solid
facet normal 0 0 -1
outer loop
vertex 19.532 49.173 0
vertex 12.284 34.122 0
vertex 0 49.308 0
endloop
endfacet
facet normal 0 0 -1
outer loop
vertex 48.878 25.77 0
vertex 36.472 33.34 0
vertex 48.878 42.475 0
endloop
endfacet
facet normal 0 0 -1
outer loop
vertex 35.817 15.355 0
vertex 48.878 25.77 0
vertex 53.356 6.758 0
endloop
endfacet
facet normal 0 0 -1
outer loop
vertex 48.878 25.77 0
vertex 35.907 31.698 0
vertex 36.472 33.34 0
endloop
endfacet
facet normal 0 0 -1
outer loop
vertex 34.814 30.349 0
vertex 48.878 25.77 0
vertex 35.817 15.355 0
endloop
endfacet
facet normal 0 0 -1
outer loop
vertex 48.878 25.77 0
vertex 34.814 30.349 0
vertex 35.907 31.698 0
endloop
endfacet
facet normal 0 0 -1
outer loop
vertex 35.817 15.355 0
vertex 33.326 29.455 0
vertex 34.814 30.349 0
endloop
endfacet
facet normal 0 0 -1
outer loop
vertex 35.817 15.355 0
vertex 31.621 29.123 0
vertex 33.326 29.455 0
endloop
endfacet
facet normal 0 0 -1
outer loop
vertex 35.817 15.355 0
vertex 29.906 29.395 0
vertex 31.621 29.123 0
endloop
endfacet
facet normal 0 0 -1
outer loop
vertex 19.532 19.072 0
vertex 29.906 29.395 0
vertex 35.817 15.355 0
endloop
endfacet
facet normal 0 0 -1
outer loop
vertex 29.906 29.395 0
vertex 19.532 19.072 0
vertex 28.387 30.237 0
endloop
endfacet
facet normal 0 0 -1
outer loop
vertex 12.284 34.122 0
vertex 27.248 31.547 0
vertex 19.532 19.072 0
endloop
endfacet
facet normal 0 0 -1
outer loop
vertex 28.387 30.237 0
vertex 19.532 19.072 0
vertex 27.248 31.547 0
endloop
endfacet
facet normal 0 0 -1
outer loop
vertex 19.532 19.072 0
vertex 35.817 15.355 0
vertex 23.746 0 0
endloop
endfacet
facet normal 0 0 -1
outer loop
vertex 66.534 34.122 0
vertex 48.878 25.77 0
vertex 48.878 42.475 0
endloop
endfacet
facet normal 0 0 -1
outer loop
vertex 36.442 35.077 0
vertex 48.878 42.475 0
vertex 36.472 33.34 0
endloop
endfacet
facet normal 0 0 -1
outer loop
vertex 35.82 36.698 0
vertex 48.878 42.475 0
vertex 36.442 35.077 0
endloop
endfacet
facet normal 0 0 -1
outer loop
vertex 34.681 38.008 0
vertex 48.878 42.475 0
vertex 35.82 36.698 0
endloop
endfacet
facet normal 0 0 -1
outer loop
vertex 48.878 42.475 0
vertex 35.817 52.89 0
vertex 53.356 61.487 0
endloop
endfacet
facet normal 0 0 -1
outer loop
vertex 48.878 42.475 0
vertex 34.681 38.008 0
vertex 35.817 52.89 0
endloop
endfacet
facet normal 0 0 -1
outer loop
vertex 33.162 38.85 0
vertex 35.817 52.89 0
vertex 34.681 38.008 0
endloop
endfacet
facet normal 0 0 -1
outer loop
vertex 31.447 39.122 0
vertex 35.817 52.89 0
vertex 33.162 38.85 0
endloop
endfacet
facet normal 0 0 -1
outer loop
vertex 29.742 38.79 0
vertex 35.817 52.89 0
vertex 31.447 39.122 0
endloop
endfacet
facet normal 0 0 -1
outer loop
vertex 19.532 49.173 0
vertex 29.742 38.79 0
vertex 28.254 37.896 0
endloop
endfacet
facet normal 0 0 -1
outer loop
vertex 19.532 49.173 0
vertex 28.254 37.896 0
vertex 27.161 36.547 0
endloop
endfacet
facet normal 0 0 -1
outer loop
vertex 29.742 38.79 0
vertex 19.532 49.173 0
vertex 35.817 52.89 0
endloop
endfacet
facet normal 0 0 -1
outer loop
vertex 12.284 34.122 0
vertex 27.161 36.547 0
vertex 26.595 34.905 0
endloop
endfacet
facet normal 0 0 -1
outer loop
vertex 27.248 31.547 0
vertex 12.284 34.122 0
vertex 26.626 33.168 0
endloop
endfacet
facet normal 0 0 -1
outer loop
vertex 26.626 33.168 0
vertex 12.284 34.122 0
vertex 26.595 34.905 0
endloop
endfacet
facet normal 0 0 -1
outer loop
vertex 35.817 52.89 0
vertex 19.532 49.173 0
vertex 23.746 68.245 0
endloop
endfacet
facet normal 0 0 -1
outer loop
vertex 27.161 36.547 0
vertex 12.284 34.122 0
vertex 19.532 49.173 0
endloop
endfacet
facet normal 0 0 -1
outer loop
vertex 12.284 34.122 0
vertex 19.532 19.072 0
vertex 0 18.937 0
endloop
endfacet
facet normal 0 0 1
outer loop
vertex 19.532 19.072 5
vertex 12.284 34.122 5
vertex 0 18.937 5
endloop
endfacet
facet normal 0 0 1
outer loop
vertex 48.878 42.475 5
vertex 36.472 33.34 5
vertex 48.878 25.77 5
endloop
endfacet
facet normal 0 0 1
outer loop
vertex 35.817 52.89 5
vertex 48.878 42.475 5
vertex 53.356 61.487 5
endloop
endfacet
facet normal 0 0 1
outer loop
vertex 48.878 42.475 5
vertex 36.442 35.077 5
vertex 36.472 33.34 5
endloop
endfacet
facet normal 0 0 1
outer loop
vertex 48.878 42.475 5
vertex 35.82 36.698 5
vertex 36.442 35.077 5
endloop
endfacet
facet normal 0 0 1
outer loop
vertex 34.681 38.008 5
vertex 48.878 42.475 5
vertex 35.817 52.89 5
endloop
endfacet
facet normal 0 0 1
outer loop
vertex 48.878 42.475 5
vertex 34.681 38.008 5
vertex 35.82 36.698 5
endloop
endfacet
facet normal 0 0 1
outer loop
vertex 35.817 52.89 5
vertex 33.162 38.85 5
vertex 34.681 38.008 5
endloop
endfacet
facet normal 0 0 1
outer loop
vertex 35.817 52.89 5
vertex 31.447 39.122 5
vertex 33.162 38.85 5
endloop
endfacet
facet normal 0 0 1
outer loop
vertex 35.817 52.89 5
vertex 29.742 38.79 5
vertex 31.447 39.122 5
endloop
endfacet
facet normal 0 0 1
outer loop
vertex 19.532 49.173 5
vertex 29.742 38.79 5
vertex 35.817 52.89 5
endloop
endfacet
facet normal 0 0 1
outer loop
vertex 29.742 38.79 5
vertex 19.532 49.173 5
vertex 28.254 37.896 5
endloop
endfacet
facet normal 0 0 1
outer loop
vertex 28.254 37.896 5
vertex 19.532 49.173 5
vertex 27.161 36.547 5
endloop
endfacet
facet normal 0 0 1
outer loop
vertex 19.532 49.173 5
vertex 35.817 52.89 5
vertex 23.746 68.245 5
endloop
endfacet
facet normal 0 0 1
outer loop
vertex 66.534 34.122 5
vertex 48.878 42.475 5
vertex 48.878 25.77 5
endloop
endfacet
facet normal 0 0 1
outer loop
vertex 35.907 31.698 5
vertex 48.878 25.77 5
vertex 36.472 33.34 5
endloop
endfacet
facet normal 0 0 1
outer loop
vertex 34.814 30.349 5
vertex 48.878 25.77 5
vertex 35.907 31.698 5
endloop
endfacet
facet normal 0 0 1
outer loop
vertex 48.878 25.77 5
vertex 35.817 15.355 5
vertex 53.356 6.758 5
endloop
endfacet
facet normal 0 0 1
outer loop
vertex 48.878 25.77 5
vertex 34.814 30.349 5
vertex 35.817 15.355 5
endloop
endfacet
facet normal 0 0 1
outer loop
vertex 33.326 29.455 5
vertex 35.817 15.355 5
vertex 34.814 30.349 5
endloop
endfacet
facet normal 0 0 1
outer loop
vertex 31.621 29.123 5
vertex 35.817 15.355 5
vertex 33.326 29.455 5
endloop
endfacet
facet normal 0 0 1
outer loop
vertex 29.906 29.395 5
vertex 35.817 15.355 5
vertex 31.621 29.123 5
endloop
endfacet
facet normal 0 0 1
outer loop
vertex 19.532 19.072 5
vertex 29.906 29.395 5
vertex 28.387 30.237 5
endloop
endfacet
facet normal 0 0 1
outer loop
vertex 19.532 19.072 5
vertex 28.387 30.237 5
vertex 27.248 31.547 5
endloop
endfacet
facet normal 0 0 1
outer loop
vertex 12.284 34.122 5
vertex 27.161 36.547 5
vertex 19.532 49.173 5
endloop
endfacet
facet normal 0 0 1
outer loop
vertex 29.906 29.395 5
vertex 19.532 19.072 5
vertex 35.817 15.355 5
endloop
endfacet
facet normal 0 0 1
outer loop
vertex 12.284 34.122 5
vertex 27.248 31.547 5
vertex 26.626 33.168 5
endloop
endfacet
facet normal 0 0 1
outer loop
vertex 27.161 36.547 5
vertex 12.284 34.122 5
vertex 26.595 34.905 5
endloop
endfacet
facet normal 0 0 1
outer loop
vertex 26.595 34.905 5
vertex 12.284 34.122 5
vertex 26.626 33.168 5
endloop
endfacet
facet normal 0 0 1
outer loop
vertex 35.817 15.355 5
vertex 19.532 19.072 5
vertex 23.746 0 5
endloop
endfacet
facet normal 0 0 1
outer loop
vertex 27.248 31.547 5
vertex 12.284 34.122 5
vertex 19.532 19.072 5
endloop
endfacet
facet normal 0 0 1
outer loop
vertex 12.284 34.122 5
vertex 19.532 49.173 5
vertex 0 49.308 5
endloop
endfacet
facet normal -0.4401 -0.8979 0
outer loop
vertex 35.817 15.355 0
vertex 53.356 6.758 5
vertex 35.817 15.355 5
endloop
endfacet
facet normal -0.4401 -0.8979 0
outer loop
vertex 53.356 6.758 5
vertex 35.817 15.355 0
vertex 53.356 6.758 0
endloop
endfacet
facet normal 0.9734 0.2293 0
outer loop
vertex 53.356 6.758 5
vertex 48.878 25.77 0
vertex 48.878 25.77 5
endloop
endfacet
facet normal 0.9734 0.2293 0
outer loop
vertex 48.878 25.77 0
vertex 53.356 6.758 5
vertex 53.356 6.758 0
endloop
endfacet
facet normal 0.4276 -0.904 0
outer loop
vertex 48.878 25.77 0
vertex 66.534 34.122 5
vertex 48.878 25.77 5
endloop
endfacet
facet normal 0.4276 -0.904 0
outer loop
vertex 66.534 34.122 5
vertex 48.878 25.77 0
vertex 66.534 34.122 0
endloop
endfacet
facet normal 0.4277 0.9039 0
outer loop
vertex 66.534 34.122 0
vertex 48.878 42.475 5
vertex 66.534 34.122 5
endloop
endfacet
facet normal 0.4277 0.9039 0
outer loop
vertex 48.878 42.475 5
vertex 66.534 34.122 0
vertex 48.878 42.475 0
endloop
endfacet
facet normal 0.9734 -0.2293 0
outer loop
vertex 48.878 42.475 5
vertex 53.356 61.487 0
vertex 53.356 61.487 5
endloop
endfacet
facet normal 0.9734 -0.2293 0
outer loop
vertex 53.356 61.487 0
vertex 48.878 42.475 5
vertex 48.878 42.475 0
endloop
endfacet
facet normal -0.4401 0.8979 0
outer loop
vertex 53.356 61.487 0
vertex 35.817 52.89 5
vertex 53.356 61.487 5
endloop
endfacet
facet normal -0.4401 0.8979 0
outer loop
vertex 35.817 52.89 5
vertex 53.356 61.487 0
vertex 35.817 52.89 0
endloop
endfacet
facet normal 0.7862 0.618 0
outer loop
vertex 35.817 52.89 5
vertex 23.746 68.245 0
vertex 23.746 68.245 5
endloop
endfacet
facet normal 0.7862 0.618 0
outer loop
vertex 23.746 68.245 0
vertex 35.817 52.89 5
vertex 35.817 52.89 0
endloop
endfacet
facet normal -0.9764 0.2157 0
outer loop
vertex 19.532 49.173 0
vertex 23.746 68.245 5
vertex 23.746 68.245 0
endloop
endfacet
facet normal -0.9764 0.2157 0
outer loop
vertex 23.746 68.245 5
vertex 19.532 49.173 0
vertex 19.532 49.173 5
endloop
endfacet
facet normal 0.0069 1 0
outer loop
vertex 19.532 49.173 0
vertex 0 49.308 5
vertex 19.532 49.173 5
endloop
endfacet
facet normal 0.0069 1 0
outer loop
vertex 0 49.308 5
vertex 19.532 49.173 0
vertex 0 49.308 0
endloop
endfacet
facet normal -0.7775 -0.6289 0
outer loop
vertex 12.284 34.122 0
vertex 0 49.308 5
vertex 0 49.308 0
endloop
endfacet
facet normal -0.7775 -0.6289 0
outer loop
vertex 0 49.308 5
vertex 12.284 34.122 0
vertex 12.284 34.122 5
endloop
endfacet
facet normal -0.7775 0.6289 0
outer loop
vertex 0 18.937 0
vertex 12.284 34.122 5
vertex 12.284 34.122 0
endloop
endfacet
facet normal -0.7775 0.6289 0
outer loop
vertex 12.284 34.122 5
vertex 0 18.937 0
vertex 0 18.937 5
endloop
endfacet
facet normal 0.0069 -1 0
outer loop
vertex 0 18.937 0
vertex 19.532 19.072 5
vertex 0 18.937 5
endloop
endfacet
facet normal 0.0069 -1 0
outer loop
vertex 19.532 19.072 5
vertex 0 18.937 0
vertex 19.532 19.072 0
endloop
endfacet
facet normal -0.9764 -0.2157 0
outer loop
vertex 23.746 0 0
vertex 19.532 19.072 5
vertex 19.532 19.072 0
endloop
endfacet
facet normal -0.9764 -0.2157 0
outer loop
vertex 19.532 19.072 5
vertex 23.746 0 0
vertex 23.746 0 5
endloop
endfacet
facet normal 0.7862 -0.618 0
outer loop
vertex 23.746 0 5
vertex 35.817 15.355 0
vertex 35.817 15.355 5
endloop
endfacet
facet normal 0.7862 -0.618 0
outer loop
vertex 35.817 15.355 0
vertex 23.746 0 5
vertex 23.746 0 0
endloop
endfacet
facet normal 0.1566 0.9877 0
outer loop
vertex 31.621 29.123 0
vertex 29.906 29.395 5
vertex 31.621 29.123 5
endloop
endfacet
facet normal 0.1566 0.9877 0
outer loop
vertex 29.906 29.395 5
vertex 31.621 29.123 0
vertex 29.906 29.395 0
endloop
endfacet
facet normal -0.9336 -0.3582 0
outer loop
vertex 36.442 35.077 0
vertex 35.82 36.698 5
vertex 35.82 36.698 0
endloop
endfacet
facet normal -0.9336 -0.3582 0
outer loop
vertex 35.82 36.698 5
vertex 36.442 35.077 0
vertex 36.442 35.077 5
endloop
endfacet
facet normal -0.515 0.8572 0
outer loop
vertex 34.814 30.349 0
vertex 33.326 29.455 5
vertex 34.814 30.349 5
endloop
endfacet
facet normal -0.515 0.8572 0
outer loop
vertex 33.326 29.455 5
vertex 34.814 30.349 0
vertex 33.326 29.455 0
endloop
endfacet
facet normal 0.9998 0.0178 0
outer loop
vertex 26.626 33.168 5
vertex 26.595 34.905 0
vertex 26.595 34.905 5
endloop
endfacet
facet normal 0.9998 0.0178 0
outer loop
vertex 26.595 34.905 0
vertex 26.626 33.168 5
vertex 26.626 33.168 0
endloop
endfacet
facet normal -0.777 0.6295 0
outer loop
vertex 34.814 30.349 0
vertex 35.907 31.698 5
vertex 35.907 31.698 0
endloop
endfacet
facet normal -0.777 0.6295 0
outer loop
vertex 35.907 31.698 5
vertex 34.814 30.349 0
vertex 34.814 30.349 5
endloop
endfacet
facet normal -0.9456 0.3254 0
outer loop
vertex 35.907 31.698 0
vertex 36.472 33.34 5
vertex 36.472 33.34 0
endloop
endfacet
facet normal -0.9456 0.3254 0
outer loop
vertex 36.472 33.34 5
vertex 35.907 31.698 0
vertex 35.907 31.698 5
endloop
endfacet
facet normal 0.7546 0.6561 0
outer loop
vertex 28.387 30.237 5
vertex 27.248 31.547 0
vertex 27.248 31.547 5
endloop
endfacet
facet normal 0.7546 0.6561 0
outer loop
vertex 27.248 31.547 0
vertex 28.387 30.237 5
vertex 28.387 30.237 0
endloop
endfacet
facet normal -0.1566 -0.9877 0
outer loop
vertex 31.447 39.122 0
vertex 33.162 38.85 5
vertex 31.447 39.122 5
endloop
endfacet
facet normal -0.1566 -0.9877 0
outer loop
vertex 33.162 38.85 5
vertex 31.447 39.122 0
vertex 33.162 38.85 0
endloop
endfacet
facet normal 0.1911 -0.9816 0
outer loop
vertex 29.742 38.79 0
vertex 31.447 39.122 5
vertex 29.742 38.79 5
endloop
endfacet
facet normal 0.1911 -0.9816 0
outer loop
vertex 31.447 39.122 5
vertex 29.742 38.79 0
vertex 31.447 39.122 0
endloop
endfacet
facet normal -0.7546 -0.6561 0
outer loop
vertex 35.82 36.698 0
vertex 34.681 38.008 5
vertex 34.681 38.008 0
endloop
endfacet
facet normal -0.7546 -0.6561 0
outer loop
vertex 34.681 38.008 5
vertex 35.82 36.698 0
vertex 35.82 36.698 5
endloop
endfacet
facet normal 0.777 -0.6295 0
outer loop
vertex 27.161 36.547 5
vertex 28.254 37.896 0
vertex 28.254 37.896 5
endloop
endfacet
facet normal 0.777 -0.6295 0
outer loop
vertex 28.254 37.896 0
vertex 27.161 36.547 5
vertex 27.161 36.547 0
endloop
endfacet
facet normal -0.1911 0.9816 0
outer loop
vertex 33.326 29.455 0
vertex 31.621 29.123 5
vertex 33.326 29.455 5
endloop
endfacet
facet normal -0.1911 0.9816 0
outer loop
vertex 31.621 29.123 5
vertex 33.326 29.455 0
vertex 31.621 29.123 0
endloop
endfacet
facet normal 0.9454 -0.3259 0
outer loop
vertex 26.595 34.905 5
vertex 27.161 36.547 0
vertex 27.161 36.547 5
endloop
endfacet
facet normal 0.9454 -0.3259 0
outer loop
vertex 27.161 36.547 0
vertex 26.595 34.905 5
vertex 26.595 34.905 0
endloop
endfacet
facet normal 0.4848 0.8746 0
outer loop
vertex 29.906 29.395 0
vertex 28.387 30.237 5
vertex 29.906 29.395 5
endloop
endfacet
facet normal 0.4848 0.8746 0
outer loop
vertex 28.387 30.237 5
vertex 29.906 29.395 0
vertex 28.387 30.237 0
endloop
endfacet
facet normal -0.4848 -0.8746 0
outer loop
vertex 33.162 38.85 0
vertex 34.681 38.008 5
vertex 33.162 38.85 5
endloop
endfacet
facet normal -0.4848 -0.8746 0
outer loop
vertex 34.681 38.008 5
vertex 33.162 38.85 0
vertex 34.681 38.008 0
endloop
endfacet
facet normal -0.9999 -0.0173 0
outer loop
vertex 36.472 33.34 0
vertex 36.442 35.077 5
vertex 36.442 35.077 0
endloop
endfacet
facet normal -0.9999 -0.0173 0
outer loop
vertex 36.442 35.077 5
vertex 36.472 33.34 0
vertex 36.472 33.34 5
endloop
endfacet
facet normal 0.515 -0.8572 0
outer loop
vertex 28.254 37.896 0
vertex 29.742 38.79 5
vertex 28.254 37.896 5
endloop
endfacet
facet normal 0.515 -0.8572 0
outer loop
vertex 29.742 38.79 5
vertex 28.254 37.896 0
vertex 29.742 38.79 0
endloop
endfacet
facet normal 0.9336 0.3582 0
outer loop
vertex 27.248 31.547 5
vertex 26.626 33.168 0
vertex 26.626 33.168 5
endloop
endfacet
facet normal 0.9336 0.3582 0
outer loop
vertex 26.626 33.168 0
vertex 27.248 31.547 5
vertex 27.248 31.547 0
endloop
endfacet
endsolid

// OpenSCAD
$fn = 32;

// ----------------------------------------------------------------------
// Star wheel: 7-point star, R35
// ----------------------------------------------------------------------

// --- parameters (mm) ---
n_points = 7;             // number of points / teeth
r_out = 35;               // tip radius
r_in = 19.25;             // root radius
bore_r = 5;               // centre bore radius
plate_t = 5;              // plate thickness, Z (extrusion height)
bore_d = 10;              // centre bore diameter

profile = [[66.534, 34.122], [48.878, 42.475], [53.356, 61.487], [35.817, 52.89], [23.746, 68.245], [19.532, 49.173], [0, 49.308], [12.284, 34.122], [0, 18.937], [19.532, 19.072], [23.746, 0], [35.817, 15.355], [53.356, 6.758], [48.878, 25.77]];  // primary outline, 14 points, counter clockwise
void_1 = [[36.442, 35.077], [35.82, 36.698], [34.681, 38.008], [33.162, 38.85], [31.447, 39.122], [29.742, 38.79], [28.254, 37.896], [27.161, 36.547], [26.595, 34.905], [26.626, 33.168], [27.248, 31.547], [28.387, 30.237], [29.906, 29.395], [31.621, 29.123], [33.326, 29.455], [34.814, 30.349], [35.907, 31.698], [36.472, 33.34]];  // centre bore, 18 points

// --- the one profile operation ---
difference() {
  linear_extrude(height = plate_t) polygon(points = profile);
  translate([0, 0, -1])
    linear_extrude(height = plate_t + 2) polygon(points = void_1);
}
